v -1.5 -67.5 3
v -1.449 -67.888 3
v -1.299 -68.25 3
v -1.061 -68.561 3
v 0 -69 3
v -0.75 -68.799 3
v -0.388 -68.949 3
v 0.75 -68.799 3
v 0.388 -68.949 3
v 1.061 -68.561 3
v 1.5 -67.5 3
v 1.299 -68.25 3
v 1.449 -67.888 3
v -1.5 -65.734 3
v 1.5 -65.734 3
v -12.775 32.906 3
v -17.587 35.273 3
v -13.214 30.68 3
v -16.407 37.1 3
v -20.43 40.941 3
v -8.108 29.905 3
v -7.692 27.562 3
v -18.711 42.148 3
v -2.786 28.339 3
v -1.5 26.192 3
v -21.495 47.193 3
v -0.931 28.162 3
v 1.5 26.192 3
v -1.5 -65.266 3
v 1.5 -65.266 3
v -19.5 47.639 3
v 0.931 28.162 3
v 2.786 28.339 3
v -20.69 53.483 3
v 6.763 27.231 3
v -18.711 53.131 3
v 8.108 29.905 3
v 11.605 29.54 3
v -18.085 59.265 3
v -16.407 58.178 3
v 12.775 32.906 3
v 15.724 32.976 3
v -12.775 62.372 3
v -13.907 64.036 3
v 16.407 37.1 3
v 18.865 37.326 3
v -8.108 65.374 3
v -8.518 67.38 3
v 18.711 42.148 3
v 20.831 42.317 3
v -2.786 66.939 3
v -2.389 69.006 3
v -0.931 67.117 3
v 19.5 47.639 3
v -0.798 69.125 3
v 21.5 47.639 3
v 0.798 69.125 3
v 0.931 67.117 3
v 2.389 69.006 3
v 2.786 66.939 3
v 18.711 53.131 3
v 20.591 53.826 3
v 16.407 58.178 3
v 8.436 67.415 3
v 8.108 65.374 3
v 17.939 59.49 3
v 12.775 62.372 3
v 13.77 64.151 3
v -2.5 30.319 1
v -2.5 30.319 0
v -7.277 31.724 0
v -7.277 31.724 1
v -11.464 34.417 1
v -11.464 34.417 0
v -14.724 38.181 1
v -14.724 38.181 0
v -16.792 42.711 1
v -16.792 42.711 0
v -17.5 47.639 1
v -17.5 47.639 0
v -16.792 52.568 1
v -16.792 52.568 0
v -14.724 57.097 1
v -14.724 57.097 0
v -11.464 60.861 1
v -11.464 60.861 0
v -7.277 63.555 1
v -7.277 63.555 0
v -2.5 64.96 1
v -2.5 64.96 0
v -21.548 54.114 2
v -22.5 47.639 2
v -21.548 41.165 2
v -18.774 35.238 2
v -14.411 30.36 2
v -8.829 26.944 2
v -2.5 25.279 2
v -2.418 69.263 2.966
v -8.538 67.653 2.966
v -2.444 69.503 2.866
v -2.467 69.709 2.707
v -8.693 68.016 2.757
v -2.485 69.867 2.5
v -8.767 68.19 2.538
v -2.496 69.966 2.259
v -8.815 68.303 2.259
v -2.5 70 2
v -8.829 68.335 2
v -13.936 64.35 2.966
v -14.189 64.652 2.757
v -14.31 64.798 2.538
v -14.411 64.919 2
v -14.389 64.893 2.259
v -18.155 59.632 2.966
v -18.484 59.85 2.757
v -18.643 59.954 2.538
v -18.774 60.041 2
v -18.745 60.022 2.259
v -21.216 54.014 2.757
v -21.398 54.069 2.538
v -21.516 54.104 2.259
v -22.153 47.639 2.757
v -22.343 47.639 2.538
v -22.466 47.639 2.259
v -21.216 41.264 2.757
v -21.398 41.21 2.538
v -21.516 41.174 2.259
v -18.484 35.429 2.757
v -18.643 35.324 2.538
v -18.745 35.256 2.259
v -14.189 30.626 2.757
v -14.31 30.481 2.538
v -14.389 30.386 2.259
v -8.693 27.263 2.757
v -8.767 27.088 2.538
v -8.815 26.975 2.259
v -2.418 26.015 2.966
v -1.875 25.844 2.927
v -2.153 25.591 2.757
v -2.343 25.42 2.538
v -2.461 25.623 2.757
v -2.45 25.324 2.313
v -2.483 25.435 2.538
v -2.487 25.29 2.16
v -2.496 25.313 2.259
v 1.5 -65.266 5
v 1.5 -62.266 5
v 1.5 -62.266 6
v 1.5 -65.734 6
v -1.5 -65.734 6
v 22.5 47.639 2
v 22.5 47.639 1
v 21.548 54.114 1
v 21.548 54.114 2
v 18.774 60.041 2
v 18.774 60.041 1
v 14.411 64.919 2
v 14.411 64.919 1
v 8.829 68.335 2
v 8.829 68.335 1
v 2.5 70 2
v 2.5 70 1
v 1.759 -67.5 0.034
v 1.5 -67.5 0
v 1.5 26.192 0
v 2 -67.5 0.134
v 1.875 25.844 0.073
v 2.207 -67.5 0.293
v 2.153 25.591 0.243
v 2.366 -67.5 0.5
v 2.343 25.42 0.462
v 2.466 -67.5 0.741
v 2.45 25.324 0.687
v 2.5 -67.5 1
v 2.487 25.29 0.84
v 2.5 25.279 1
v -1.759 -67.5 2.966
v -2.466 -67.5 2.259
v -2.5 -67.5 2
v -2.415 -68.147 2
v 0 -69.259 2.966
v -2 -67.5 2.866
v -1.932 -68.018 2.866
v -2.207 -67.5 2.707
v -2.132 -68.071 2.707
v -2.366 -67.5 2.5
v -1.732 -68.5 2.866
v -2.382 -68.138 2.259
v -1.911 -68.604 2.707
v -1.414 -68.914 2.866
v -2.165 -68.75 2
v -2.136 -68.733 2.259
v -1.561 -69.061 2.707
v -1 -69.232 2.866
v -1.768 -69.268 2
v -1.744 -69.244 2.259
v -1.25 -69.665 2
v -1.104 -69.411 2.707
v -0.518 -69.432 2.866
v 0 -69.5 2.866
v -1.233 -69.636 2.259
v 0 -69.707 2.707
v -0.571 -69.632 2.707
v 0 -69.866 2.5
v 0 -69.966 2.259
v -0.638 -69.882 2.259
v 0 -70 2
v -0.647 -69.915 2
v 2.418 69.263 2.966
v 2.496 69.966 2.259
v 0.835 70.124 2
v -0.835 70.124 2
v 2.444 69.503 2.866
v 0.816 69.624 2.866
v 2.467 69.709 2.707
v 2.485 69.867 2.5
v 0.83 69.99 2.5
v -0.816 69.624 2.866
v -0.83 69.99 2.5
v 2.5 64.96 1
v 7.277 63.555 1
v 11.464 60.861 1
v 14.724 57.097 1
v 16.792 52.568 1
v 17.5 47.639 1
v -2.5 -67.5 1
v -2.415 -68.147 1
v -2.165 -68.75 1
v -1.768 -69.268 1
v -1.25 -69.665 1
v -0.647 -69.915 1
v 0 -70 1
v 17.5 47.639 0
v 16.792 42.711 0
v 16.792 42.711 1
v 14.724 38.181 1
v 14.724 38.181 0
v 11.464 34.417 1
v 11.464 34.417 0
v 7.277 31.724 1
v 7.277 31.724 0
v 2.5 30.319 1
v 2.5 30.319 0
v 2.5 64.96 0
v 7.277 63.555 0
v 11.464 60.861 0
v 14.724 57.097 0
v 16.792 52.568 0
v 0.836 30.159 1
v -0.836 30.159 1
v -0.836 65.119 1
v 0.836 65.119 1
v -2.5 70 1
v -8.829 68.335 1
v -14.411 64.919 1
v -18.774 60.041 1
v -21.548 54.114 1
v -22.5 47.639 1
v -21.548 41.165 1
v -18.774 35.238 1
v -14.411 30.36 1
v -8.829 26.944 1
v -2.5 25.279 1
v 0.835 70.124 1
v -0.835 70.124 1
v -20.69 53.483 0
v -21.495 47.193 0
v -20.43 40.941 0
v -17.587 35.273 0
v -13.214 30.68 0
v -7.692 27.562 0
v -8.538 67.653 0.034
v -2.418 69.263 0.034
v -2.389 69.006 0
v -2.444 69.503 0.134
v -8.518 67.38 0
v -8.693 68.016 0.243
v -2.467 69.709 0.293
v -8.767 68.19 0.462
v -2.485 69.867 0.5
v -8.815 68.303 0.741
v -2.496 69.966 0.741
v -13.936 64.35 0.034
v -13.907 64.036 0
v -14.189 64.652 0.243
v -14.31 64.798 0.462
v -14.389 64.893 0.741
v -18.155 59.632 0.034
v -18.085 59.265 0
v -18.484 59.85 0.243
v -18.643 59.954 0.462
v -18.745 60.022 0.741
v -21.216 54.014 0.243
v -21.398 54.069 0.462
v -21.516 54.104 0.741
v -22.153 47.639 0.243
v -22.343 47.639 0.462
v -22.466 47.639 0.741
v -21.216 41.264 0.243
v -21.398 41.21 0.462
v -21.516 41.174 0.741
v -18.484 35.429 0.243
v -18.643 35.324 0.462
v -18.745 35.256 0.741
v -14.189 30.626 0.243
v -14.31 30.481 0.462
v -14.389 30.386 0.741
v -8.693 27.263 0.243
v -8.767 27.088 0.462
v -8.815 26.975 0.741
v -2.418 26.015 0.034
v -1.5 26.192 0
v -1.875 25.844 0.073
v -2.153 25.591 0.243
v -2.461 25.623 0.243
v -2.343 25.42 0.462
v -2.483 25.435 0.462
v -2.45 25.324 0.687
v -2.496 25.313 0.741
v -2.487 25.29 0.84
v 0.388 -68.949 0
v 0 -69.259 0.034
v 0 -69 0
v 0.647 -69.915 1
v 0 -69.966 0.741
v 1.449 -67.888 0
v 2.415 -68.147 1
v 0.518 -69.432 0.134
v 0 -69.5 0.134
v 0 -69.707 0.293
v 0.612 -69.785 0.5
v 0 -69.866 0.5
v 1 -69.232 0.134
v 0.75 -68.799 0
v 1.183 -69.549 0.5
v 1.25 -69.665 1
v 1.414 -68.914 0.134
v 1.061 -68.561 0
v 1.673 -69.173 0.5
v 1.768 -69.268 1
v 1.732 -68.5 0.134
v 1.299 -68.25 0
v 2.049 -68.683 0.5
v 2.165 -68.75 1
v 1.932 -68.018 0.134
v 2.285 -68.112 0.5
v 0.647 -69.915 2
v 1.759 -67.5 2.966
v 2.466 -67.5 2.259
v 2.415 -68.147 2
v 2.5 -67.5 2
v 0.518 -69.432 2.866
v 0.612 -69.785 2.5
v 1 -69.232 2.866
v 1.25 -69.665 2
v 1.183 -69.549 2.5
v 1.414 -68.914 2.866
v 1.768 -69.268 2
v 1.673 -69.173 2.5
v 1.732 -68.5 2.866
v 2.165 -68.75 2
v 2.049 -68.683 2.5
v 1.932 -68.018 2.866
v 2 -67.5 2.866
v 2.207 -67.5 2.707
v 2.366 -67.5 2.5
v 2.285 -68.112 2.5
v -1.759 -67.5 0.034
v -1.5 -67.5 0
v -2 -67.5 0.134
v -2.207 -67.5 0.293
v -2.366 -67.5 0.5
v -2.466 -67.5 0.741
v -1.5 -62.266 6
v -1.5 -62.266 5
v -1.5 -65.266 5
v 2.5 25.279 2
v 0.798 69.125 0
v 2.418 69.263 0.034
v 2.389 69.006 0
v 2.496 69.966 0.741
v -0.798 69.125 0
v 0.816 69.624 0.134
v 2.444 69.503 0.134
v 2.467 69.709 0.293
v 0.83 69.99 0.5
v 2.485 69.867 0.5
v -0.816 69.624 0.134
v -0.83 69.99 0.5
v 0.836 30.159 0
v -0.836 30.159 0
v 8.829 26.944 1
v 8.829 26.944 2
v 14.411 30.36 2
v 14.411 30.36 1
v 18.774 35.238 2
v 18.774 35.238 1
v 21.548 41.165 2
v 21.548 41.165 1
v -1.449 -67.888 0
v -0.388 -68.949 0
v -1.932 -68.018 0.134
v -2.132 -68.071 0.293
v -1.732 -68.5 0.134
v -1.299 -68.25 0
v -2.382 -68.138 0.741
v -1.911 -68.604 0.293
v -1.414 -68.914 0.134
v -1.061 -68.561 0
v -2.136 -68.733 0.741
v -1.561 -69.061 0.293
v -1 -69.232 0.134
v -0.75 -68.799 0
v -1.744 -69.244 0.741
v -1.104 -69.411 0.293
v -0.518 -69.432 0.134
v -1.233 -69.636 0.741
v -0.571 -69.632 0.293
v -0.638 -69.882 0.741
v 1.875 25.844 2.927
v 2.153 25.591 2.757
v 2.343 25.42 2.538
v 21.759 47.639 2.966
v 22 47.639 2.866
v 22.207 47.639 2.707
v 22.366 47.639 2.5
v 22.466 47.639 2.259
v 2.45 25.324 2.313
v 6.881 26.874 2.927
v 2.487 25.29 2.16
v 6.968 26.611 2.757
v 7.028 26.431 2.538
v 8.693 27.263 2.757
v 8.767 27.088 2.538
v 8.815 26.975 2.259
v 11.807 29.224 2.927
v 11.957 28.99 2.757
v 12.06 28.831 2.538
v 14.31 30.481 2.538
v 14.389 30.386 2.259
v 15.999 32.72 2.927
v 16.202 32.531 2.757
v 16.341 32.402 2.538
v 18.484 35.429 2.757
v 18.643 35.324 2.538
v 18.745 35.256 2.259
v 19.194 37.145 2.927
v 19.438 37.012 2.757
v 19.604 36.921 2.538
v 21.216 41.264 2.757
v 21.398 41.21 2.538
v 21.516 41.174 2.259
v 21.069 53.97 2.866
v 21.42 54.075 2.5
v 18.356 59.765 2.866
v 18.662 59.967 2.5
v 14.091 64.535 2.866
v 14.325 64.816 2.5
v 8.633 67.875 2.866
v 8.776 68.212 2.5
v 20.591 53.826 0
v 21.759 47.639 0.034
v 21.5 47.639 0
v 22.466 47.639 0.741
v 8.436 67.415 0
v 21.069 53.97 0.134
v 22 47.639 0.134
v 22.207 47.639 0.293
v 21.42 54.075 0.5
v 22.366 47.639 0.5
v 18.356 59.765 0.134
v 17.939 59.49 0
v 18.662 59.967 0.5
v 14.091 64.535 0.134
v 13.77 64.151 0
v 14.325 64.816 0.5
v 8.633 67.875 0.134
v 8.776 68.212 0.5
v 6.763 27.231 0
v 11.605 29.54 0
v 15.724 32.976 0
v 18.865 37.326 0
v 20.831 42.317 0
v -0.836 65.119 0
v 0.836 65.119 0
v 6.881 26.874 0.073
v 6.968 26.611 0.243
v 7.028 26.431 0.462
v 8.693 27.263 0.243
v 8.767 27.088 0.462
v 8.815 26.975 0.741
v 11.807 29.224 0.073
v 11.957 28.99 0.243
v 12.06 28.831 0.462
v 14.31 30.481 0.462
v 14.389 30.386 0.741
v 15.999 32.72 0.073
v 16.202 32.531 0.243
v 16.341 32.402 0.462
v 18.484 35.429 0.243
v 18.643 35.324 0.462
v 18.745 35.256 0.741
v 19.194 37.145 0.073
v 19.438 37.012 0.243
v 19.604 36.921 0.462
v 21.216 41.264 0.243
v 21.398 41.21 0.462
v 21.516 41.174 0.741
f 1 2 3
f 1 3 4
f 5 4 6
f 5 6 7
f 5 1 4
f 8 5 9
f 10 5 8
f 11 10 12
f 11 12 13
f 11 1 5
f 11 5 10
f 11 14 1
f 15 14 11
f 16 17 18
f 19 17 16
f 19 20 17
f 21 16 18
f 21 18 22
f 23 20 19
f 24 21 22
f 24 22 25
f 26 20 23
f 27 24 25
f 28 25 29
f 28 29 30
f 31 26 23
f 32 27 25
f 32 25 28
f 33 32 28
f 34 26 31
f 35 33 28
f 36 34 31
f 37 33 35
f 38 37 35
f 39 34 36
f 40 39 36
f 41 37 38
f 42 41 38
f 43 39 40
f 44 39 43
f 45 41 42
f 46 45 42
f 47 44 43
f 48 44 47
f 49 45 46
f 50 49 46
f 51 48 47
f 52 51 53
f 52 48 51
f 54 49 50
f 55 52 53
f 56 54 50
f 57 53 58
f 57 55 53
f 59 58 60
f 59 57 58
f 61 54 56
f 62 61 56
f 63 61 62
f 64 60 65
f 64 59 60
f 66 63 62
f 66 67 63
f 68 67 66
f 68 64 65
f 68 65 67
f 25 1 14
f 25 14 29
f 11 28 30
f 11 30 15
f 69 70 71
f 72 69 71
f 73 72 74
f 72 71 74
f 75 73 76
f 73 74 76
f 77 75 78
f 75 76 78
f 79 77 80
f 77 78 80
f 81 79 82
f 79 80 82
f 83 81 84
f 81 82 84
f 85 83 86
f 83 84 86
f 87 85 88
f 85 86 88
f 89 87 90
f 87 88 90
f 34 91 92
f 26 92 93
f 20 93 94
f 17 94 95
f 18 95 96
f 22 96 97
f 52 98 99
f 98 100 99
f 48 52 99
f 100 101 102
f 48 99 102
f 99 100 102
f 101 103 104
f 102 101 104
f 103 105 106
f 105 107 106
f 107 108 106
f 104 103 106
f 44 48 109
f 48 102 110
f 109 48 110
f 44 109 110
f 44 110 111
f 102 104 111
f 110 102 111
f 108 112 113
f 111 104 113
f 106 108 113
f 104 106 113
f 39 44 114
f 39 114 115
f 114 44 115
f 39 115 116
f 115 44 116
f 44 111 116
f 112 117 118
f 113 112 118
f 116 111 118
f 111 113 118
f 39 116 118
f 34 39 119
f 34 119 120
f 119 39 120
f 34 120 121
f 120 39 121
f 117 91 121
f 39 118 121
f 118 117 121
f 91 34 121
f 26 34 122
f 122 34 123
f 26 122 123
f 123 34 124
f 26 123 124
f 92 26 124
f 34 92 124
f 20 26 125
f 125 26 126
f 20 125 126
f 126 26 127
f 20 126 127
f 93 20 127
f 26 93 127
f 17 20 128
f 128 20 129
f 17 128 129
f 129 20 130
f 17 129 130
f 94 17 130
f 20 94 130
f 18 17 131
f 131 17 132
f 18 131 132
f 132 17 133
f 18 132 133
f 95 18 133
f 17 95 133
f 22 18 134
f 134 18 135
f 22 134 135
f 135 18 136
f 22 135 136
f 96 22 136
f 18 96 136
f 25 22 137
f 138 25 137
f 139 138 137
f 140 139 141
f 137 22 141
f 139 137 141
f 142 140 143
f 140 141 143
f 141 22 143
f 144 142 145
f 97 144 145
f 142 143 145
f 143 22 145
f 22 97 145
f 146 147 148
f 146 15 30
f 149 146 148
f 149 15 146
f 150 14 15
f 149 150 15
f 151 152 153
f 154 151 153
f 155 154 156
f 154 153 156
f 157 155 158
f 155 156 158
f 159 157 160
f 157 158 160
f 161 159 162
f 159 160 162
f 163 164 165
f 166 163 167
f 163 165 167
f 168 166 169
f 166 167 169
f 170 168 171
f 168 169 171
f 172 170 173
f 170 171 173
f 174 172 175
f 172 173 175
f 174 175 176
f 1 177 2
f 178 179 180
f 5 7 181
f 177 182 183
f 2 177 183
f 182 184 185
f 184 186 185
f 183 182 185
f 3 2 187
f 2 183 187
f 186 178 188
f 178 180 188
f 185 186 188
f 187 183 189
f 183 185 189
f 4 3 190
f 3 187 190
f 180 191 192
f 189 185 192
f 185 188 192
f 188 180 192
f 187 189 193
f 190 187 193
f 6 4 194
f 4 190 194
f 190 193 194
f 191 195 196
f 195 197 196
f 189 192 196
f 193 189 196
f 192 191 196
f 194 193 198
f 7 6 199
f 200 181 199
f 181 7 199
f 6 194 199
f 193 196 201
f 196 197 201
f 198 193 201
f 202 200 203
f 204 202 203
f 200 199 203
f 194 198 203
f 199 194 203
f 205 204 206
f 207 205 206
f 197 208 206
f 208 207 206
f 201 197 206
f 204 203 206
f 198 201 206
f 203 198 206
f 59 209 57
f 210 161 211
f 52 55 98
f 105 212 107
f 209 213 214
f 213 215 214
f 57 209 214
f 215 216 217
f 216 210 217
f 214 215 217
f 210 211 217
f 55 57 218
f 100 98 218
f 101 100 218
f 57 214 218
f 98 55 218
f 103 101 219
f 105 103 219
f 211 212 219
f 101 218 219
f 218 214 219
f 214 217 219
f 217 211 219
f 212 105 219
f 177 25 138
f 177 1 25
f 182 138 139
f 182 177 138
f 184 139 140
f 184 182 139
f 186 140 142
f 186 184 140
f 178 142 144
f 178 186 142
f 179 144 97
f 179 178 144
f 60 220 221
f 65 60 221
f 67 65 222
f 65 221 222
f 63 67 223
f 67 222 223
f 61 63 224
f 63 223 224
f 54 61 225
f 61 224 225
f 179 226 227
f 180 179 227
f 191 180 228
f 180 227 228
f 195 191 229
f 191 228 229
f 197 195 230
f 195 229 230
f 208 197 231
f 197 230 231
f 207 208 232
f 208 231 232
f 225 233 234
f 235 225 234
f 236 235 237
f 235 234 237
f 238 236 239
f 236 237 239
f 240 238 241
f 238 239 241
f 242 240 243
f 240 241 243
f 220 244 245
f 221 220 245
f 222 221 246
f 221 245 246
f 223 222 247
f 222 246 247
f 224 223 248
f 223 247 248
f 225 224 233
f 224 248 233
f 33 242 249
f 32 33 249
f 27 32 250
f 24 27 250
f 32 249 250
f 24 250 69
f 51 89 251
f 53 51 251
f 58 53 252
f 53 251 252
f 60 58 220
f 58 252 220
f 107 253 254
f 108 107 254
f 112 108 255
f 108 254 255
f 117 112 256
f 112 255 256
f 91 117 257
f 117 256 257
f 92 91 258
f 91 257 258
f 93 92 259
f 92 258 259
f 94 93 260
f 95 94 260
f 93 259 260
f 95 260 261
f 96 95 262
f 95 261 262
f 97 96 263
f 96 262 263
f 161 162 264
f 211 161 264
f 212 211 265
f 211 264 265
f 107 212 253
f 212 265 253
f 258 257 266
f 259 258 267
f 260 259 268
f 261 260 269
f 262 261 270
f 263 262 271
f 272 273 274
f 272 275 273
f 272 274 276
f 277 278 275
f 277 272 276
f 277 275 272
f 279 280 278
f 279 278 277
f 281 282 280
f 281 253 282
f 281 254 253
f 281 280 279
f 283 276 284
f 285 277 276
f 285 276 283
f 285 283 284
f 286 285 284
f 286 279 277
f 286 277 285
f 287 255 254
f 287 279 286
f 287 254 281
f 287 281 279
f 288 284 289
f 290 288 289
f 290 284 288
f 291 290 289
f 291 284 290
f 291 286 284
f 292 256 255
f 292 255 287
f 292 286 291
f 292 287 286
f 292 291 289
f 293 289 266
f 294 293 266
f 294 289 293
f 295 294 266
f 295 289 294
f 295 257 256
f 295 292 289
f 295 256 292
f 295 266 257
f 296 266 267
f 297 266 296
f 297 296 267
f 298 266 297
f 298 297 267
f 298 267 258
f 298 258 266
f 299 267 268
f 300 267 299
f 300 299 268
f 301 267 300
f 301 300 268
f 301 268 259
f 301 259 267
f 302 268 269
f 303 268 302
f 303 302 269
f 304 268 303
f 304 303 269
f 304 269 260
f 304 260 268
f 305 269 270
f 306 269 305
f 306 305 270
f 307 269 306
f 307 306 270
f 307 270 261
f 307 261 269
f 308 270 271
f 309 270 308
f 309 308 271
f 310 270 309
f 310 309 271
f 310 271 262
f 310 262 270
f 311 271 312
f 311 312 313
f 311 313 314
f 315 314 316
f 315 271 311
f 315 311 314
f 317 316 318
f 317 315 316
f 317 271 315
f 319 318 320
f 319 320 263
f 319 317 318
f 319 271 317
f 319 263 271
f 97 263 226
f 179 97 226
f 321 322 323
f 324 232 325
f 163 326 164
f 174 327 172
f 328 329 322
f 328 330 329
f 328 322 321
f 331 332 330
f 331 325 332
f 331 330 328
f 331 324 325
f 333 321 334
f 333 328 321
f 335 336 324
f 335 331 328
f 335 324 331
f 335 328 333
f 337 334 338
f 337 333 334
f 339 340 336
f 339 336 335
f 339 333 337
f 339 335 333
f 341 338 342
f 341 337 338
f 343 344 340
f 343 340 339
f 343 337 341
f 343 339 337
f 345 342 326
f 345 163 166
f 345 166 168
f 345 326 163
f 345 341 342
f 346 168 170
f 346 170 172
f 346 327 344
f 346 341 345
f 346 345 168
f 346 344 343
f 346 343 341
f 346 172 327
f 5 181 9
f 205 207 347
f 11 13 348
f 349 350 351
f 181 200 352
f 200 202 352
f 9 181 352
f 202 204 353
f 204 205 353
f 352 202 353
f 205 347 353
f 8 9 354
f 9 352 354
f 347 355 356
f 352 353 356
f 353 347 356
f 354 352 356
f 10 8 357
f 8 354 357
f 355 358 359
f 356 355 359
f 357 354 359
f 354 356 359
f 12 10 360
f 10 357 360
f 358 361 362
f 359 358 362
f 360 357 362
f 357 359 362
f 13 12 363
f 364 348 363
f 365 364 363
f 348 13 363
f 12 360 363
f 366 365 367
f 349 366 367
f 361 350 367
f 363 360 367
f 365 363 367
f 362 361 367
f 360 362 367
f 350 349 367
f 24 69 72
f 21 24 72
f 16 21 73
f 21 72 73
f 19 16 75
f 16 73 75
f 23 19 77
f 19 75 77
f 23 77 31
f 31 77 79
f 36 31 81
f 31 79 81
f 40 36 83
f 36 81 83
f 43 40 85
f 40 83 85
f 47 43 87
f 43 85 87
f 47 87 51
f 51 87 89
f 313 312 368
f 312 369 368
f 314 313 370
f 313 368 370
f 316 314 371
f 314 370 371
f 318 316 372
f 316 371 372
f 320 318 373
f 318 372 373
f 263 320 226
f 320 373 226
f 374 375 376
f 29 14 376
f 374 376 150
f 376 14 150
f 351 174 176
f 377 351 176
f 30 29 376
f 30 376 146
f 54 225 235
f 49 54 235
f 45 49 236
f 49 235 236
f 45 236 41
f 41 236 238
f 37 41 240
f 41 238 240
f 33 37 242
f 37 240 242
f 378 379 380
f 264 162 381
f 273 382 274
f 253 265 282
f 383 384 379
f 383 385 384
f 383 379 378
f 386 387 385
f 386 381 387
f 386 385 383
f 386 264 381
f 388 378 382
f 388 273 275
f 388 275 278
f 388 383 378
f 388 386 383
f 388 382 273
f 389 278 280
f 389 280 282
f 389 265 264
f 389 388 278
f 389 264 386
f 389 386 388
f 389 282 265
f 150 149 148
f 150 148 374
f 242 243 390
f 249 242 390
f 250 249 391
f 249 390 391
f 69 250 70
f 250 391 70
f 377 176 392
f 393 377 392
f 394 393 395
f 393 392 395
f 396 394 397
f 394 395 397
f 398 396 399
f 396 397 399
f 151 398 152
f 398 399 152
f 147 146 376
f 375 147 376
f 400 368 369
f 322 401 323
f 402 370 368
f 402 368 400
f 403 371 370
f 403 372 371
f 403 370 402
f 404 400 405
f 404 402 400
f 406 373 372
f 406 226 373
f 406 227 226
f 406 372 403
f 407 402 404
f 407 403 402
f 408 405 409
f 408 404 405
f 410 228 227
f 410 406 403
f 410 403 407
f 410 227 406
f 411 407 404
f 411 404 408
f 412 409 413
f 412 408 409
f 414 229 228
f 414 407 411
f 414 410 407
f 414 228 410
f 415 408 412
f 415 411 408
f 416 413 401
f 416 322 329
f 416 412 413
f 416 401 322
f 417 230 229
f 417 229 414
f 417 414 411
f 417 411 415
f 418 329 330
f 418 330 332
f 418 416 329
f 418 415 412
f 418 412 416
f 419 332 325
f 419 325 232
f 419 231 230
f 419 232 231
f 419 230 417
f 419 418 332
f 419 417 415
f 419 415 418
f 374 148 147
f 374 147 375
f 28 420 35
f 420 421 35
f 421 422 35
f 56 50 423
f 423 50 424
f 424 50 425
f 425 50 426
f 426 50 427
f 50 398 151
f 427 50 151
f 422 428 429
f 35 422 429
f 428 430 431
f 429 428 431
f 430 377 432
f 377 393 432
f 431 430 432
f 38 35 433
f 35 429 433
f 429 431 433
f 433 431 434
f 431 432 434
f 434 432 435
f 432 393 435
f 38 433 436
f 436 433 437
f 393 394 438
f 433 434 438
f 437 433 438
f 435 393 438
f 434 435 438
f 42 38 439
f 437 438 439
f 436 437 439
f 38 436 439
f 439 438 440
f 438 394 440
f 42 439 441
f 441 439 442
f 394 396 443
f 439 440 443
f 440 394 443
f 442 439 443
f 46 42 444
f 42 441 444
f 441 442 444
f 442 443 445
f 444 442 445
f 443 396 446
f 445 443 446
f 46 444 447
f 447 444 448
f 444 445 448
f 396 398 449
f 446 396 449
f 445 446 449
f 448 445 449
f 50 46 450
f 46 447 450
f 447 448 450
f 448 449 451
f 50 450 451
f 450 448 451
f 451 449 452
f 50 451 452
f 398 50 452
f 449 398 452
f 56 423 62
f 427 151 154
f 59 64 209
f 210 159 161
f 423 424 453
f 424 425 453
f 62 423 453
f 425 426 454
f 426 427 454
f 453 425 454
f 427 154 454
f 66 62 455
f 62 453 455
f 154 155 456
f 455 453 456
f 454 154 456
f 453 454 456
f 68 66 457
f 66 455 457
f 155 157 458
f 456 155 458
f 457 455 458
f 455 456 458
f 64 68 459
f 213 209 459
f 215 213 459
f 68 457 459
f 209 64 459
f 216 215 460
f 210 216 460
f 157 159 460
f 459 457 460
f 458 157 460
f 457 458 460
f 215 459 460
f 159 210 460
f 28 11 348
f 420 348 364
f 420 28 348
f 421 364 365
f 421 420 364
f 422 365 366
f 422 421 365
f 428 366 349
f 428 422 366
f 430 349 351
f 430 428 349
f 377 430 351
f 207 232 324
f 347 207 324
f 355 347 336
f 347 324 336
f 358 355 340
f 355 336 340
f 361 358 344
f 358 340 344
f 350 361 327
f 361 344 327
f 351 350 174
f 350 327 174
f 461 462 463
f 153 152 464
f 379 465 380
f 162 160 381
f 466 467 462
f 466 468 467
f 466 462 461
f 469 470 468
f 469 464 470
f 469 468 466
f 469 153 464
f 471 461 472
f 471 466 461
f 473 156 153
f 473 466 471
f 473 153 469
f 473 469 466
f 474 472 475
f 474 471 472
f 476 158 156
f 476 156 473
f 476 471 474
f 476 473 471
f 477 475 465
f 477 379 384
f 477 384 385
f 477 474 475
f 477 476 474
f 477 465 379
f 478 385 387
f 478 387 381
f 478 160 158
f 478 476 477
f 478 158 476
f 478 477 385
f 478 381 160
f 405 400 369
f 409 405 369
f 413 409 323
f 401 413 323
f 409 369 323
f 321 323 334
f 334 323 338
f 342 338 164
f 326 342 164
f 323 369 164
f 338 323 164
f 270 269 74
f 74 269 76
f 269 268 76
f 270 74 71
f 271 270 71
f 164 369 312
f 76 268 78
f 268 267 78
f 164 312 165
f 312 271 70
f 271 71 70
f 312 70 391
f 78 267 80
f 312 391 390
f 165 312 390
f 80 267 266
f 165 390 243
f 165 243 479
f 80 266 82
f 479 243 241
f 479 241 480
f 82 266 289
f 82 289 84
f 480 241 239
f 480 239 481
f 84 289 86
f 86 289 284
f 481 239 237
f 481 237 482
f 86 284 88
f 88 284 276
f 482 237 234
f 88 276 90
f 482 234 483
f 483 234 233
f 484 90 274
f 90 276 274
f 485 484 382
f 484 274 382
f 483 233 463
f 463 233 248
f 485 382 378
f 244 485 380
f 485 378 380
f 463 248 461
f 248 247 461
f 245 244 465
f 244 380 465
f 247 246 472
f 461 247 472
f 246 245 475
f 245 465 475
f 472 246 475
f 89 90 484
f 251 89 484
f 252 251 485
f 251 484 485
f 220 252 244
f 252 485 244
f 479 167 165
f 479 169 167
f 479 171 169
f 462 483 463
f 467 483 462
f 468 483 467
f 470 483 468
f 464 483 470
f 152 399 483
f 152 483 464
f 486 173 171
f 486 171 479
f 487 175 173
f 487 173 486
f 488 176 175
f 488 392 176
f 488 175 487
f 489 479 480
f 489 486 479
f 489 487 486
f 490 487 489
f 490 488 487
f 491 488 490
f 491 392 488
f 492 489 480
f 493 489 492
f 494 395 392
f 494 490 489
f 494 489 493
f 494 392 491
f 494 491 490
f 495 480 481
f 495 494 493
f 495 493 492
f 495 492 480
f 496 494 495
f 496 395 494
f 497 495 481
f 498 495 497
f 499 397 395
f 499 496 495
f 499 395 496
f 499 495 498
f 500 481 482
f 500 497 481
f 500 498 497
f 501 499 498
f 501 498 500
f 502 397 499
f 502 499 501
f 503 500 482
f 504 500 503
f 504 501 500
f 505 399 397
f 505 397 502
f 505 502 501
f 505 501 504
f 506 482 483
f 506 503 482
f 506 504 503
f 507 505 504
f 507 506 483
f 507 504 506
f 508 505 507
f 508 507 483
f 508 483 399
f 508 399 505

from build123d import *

# Parameters (mm, degrees)
F1_DEPTH = 3
F0_W     = 3
F0_H     = 0.2339549768
F2_DEPTH = 6
F3_W     = 3
F3_H     = 1
F4_DEPTH = 3
F5_R     = 0.99999
F6_SIZE  = 2


# Not quite as in the source:
# - a fillet or chamfer is up to 0.001 mm smaller than in the source, because OpenCascade refuses the exact size
# - a feature names something its author has since deleted; it is built from what else it names


with BuildPart() as f1:
    # F0 (on Top) → F1 (new body)
    with BuildSketch(Plane.XY):
        with BuildLine():
            Line((-2.5, 70), (2.5, 70))
            ThreePointArc((2.5, 70), (0, 70.139320225), (-2.5, 70))
        make_face()
        with BuildLine():
            ThreePointArc((22.5, 47.639320225), (16.7705098312, 62.639320225), (2.5, 70))
            Line((2.5, 70), (2.5, 64.9598283007))
            ThreePointArc((2.5, 64.9598283007), (13.2287565553, 59.0957594624), (17.5, 47.639320225))
            ThreePointArc((17.5, 47.639320225), (13.2287565553, 36.1828809876), (2.5, 30.3188121493))
            Line((2.5, 30.3188121493), (2.5, 25.27864045))
            ThreePointArc((2.5, 25.27864045), (16.7705098312, 32.639320225), (22.5, 47.639320225))
        make_face()
        with BuildLine():
            Line((-2.5, 64.9598283007), (-2.5, 70))
            ThreePointArc((-2.5, 70), (-22.5, 47.639320225), (-2.5, 25.27864045))
            Line((-2.5, 25.27864045), (-2.5, 30.3188121493))
            ThreePointArc((-2.5, 30.3188121493), (-17.5, 47.639320225), (-2.5, 64.9598283007))
        make_face()
        with BuildLine():
            Line((2.5, 64.9598283007), (2.5, 70))
            Line((2.5, 70), (-2.5, 70))
            Line((-2.5, 70), (-2.5, 64.9598283007))
            ThreePointArc((-2.5, 64.9598283007), (0, 65.139320225), (2.5, 64.9598283007))
        make_face()
        with BuildLine():
            Line((-2.5, 30.3188121493), (-2.5, 25.27864045))
            ThreePointArc((-2.5, 25.27864045), (0, 25.139320225), (2.5, 25.27864045))
            Line((2.5, 25.27864045), (2.5, 30.3188121493))
            ThreePointArc((2.5, 30.3188121493), (0, 30.139320225), (-2.5, 30.3188121493))
        make_face()
        with BuildLine():
            Line((-1.5, -65.5), (-2.5, -65.5))
            Line((-2.5, -65.5), (-2.5, -67.5))
            ThreePointArc((-2.5, -67.5), (-1.767766953, -69.267766953), (0, -70))
            ThreePointArc((0, -70), (1.767766953, -69.267766953), (2.5, -67.5))
            Line((2.5, -67.5), (2.5, -65.5))
            Line((2.5, -65.5), (1.5, -65.5))
            Line((1.5, -65.5), (1.5, -65.7339549768))
            Line((1.5, -65.7339549768), (-1.5, -65.7339549768))
            Line((-1.5, -65.7339549768), (-1.5, -65.5))
        make_face()
        with BuildLine():
            ThreePointArc((2.5, 25.27864045), (0, 25.139320225), (-2.5, 25.27864045))
            Line((-2.5, 25.27864045), (-2.5, -65.5))
            Line((-2.5, -65.5), (-1.5, -65.5))
            Line((-1.5, -65.5), (-1.5, -65.2660450232))
            Line((-1.5, -65.2660450232), (1.5, -65.2660450232))
            Line((1.5, -65.2660450232), (1.5, -65.5))
            Line((1.5, -65.5), (2.5, -65.5))
            Line((2.5, -65.5), (2.5, 25.27864045))
        make_face()
    extrude(amount=F1_DEPTH)

    # F0 (on Top) → F2 (join)
    with BuildSketch(Plane.XY):
        with Locations((0, -65.3830225116)):
            Rectangle(F0_W, F0_H)
        with Locations((0, -65.6169774884)):
            Rectangle(F0_W, F0_H)
    extrude(amount=F2_DEPTH)

    # F3 (on face) → F4 (join)
    with BuildSketch(Plane(origin=(0, -65.2660450232, 0), x_dir=(-1, 0, 0), z_dir=(0, 1, 0))):
        with Locations((0, 5.5)):
            Rectangle(F3_W, F3_H)
    extrude(amount=F4_DEPTH)

    # F5 (radius 1 in the source; OpenCascade refuses exactly that, so slightly less here)
    f5_edges = [f1.edges().sort_by_distance(p)[0] for p in [
        (0, 70.13932, 3),
        (0, 70.13932, 0),
        (2.5, -21.11068, 0),
        (2.5, -21.11068, 3),
        (-2.5, -21.11068, 3),
        (-2.5, -21.11068, 0),
    ]]
    fillet(f5_edges, radius=F5_R)

    # F6
    f6_edges = [f1.edges().sort_by_distance(p)[0] for p in [
        (-2.5, 64.959828, 3),
    ]]
    chamfer(f6_edges, length=F6_SIZE)


solid = f1.part
